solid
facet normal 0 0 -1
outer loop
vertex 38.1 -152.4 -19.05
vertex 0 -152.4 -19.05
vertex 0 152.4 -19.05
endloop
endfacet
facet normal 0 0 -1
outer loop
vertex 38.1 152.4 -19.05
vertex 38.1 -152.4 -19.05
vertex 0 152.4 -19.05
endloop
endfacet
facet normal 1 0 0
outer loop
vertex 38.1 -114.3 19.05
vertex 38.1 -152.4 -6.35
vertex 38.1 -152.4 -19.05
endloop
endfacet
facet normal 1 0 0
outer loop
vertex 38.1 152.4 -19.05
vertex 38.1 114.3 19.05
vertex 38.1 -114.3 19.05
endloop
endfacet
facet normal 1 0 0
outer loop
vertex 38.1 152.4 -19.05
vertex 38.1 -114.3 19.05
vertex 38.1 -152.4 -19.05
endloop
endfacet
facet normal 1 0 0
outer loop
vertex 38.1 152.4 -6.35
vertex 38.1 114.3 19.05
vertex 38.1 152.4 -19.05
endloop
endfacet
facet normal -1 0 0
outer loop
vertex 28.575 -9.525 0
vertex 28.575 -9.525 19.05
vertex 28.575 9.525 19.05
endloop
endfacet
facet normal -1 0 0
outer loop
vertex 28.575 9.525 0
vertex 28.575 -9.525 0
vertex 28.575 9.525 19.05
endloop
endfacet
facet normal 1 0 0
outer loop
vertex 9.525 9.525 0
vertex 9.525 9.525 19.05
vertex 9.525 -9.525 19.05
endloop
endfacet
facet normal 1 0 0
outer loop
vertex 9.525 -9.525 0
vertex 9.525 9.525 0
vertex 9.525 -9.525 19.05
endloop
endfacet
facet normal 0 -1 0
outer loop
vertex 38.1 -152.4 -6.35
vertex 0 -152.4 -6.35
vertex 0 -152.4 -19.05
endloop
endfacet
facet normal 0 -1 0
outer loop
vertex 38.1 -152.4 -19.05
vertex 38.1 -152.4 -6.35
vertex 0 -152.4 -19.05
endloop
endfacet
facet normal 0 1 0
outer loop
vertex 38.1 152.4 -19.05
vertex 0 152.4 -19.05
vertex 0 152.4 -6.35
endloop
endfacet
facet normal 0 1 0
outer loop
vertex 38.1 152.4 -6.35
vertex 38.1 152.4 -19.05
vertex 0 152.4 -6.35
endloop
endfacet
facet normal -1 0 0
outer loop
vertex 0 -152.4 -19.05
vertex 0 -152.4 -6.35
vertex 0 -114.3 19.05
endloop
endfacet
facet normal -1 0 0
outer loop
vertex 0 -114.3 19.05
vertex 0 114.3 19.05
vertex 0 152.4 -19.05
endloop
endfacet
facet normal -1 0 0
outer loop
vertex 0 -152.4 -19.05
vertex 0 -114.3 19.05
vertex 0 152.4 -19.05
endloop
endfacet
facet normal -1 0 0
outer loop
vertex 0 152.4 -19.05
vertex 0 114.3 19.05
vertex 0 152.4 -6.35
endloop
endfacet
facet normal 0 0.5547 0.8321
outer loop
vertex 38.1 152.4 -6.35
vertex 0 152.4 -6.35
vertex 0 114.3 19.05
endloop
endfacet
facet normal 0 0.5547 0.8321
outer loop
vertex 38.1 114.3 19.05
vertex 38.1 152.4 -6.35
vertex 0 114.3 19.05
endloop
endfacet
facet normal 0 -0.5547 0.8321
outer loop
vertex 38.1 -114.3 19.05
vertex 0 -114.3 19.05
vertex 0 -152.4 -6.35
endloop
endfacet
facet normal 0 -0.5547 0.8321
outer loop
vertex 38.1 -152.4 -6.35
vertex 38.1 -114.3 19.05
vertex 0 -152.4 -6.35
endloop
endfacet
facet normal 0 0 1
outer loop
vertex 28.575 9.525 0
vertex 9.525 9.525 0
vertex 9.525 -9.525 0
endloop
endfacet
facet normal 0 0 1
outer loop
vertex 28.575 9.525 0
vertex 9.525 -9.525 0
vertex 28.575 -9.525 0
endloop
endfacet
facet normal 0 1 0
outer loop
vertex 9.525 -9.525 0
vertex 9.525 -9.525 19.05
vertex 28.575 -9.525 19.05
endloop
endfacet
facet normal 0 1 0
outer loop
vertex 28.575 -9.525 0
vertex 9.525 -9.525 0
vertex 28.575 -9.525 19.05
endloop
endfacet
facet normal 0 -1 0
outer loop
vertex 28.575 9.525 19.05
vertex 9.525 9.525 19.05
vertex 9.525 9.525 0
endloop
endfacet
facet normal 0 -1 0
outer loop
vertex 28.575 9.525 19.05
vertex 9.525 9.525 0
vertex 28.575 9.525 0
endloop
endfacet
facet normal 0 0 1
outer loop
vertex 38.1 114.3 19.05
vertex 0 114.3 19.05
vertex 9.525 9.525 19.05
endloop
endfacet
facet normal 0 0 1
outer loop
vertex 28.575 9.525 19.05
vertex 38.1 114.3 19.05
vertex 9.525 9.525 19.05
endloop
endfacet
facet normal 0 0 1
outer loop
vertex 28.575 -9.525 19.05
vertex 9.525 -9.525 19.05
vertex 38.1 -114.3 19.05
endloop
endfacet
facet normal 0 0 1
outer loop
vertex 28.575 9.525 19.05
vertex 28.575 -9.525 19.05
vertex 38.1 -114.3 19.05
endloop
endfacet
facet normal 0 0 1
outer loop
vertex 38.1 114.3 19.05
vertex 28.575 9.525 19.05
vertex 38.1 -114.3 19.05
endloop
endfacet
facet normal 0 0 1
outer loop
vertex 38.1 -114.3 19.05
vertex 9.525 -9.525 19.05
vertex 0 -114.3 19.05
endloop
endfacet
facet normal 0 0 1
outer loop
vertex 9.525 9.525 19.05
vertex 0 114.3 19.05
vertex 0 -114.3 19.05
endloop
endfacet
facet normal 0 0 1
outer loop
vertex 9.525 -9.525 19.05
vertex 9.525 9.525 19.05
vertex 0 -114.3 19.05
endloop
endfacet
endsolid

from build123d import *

# Parameters (mm, degrees)
F1_DEPTH = 38.1
F2_W     = 19.05
F2_H     = 9.525
F3_DEPTH = 19.05


with BuildPart() as f1:
    # F0 (on Right) → F1 (new body)
    with BuildSketch(Plane.YZ):
        Polygon((152.4, -6.35), (114.3, 19.05), (-114.3, 19.05), (-152.4, -6.35), (-152.4, -19.05), (-101.6, -19.05), (76.2, -19.05), (152.4, -19.05), align=None)
    extrude(amount=F1_DEPTH)

    # F2 (on face) → F3 (cut)
    with BuildSketch(Plane.XY.offset(19.05)):
        with Locations((19.05, 4.7625)):
            Rectangle(F2_W, F2_H)
        with Locations((19.05, -4.7625)):
            Rectangle(F2_W, F2_H)
    extrude(amount=-F3_DEPTH, mode=Mode.SUBTRACT)


with BuildPart() as f4_1:
    # F4: copy of F1
    add(f1.part)


solid = f1.part
